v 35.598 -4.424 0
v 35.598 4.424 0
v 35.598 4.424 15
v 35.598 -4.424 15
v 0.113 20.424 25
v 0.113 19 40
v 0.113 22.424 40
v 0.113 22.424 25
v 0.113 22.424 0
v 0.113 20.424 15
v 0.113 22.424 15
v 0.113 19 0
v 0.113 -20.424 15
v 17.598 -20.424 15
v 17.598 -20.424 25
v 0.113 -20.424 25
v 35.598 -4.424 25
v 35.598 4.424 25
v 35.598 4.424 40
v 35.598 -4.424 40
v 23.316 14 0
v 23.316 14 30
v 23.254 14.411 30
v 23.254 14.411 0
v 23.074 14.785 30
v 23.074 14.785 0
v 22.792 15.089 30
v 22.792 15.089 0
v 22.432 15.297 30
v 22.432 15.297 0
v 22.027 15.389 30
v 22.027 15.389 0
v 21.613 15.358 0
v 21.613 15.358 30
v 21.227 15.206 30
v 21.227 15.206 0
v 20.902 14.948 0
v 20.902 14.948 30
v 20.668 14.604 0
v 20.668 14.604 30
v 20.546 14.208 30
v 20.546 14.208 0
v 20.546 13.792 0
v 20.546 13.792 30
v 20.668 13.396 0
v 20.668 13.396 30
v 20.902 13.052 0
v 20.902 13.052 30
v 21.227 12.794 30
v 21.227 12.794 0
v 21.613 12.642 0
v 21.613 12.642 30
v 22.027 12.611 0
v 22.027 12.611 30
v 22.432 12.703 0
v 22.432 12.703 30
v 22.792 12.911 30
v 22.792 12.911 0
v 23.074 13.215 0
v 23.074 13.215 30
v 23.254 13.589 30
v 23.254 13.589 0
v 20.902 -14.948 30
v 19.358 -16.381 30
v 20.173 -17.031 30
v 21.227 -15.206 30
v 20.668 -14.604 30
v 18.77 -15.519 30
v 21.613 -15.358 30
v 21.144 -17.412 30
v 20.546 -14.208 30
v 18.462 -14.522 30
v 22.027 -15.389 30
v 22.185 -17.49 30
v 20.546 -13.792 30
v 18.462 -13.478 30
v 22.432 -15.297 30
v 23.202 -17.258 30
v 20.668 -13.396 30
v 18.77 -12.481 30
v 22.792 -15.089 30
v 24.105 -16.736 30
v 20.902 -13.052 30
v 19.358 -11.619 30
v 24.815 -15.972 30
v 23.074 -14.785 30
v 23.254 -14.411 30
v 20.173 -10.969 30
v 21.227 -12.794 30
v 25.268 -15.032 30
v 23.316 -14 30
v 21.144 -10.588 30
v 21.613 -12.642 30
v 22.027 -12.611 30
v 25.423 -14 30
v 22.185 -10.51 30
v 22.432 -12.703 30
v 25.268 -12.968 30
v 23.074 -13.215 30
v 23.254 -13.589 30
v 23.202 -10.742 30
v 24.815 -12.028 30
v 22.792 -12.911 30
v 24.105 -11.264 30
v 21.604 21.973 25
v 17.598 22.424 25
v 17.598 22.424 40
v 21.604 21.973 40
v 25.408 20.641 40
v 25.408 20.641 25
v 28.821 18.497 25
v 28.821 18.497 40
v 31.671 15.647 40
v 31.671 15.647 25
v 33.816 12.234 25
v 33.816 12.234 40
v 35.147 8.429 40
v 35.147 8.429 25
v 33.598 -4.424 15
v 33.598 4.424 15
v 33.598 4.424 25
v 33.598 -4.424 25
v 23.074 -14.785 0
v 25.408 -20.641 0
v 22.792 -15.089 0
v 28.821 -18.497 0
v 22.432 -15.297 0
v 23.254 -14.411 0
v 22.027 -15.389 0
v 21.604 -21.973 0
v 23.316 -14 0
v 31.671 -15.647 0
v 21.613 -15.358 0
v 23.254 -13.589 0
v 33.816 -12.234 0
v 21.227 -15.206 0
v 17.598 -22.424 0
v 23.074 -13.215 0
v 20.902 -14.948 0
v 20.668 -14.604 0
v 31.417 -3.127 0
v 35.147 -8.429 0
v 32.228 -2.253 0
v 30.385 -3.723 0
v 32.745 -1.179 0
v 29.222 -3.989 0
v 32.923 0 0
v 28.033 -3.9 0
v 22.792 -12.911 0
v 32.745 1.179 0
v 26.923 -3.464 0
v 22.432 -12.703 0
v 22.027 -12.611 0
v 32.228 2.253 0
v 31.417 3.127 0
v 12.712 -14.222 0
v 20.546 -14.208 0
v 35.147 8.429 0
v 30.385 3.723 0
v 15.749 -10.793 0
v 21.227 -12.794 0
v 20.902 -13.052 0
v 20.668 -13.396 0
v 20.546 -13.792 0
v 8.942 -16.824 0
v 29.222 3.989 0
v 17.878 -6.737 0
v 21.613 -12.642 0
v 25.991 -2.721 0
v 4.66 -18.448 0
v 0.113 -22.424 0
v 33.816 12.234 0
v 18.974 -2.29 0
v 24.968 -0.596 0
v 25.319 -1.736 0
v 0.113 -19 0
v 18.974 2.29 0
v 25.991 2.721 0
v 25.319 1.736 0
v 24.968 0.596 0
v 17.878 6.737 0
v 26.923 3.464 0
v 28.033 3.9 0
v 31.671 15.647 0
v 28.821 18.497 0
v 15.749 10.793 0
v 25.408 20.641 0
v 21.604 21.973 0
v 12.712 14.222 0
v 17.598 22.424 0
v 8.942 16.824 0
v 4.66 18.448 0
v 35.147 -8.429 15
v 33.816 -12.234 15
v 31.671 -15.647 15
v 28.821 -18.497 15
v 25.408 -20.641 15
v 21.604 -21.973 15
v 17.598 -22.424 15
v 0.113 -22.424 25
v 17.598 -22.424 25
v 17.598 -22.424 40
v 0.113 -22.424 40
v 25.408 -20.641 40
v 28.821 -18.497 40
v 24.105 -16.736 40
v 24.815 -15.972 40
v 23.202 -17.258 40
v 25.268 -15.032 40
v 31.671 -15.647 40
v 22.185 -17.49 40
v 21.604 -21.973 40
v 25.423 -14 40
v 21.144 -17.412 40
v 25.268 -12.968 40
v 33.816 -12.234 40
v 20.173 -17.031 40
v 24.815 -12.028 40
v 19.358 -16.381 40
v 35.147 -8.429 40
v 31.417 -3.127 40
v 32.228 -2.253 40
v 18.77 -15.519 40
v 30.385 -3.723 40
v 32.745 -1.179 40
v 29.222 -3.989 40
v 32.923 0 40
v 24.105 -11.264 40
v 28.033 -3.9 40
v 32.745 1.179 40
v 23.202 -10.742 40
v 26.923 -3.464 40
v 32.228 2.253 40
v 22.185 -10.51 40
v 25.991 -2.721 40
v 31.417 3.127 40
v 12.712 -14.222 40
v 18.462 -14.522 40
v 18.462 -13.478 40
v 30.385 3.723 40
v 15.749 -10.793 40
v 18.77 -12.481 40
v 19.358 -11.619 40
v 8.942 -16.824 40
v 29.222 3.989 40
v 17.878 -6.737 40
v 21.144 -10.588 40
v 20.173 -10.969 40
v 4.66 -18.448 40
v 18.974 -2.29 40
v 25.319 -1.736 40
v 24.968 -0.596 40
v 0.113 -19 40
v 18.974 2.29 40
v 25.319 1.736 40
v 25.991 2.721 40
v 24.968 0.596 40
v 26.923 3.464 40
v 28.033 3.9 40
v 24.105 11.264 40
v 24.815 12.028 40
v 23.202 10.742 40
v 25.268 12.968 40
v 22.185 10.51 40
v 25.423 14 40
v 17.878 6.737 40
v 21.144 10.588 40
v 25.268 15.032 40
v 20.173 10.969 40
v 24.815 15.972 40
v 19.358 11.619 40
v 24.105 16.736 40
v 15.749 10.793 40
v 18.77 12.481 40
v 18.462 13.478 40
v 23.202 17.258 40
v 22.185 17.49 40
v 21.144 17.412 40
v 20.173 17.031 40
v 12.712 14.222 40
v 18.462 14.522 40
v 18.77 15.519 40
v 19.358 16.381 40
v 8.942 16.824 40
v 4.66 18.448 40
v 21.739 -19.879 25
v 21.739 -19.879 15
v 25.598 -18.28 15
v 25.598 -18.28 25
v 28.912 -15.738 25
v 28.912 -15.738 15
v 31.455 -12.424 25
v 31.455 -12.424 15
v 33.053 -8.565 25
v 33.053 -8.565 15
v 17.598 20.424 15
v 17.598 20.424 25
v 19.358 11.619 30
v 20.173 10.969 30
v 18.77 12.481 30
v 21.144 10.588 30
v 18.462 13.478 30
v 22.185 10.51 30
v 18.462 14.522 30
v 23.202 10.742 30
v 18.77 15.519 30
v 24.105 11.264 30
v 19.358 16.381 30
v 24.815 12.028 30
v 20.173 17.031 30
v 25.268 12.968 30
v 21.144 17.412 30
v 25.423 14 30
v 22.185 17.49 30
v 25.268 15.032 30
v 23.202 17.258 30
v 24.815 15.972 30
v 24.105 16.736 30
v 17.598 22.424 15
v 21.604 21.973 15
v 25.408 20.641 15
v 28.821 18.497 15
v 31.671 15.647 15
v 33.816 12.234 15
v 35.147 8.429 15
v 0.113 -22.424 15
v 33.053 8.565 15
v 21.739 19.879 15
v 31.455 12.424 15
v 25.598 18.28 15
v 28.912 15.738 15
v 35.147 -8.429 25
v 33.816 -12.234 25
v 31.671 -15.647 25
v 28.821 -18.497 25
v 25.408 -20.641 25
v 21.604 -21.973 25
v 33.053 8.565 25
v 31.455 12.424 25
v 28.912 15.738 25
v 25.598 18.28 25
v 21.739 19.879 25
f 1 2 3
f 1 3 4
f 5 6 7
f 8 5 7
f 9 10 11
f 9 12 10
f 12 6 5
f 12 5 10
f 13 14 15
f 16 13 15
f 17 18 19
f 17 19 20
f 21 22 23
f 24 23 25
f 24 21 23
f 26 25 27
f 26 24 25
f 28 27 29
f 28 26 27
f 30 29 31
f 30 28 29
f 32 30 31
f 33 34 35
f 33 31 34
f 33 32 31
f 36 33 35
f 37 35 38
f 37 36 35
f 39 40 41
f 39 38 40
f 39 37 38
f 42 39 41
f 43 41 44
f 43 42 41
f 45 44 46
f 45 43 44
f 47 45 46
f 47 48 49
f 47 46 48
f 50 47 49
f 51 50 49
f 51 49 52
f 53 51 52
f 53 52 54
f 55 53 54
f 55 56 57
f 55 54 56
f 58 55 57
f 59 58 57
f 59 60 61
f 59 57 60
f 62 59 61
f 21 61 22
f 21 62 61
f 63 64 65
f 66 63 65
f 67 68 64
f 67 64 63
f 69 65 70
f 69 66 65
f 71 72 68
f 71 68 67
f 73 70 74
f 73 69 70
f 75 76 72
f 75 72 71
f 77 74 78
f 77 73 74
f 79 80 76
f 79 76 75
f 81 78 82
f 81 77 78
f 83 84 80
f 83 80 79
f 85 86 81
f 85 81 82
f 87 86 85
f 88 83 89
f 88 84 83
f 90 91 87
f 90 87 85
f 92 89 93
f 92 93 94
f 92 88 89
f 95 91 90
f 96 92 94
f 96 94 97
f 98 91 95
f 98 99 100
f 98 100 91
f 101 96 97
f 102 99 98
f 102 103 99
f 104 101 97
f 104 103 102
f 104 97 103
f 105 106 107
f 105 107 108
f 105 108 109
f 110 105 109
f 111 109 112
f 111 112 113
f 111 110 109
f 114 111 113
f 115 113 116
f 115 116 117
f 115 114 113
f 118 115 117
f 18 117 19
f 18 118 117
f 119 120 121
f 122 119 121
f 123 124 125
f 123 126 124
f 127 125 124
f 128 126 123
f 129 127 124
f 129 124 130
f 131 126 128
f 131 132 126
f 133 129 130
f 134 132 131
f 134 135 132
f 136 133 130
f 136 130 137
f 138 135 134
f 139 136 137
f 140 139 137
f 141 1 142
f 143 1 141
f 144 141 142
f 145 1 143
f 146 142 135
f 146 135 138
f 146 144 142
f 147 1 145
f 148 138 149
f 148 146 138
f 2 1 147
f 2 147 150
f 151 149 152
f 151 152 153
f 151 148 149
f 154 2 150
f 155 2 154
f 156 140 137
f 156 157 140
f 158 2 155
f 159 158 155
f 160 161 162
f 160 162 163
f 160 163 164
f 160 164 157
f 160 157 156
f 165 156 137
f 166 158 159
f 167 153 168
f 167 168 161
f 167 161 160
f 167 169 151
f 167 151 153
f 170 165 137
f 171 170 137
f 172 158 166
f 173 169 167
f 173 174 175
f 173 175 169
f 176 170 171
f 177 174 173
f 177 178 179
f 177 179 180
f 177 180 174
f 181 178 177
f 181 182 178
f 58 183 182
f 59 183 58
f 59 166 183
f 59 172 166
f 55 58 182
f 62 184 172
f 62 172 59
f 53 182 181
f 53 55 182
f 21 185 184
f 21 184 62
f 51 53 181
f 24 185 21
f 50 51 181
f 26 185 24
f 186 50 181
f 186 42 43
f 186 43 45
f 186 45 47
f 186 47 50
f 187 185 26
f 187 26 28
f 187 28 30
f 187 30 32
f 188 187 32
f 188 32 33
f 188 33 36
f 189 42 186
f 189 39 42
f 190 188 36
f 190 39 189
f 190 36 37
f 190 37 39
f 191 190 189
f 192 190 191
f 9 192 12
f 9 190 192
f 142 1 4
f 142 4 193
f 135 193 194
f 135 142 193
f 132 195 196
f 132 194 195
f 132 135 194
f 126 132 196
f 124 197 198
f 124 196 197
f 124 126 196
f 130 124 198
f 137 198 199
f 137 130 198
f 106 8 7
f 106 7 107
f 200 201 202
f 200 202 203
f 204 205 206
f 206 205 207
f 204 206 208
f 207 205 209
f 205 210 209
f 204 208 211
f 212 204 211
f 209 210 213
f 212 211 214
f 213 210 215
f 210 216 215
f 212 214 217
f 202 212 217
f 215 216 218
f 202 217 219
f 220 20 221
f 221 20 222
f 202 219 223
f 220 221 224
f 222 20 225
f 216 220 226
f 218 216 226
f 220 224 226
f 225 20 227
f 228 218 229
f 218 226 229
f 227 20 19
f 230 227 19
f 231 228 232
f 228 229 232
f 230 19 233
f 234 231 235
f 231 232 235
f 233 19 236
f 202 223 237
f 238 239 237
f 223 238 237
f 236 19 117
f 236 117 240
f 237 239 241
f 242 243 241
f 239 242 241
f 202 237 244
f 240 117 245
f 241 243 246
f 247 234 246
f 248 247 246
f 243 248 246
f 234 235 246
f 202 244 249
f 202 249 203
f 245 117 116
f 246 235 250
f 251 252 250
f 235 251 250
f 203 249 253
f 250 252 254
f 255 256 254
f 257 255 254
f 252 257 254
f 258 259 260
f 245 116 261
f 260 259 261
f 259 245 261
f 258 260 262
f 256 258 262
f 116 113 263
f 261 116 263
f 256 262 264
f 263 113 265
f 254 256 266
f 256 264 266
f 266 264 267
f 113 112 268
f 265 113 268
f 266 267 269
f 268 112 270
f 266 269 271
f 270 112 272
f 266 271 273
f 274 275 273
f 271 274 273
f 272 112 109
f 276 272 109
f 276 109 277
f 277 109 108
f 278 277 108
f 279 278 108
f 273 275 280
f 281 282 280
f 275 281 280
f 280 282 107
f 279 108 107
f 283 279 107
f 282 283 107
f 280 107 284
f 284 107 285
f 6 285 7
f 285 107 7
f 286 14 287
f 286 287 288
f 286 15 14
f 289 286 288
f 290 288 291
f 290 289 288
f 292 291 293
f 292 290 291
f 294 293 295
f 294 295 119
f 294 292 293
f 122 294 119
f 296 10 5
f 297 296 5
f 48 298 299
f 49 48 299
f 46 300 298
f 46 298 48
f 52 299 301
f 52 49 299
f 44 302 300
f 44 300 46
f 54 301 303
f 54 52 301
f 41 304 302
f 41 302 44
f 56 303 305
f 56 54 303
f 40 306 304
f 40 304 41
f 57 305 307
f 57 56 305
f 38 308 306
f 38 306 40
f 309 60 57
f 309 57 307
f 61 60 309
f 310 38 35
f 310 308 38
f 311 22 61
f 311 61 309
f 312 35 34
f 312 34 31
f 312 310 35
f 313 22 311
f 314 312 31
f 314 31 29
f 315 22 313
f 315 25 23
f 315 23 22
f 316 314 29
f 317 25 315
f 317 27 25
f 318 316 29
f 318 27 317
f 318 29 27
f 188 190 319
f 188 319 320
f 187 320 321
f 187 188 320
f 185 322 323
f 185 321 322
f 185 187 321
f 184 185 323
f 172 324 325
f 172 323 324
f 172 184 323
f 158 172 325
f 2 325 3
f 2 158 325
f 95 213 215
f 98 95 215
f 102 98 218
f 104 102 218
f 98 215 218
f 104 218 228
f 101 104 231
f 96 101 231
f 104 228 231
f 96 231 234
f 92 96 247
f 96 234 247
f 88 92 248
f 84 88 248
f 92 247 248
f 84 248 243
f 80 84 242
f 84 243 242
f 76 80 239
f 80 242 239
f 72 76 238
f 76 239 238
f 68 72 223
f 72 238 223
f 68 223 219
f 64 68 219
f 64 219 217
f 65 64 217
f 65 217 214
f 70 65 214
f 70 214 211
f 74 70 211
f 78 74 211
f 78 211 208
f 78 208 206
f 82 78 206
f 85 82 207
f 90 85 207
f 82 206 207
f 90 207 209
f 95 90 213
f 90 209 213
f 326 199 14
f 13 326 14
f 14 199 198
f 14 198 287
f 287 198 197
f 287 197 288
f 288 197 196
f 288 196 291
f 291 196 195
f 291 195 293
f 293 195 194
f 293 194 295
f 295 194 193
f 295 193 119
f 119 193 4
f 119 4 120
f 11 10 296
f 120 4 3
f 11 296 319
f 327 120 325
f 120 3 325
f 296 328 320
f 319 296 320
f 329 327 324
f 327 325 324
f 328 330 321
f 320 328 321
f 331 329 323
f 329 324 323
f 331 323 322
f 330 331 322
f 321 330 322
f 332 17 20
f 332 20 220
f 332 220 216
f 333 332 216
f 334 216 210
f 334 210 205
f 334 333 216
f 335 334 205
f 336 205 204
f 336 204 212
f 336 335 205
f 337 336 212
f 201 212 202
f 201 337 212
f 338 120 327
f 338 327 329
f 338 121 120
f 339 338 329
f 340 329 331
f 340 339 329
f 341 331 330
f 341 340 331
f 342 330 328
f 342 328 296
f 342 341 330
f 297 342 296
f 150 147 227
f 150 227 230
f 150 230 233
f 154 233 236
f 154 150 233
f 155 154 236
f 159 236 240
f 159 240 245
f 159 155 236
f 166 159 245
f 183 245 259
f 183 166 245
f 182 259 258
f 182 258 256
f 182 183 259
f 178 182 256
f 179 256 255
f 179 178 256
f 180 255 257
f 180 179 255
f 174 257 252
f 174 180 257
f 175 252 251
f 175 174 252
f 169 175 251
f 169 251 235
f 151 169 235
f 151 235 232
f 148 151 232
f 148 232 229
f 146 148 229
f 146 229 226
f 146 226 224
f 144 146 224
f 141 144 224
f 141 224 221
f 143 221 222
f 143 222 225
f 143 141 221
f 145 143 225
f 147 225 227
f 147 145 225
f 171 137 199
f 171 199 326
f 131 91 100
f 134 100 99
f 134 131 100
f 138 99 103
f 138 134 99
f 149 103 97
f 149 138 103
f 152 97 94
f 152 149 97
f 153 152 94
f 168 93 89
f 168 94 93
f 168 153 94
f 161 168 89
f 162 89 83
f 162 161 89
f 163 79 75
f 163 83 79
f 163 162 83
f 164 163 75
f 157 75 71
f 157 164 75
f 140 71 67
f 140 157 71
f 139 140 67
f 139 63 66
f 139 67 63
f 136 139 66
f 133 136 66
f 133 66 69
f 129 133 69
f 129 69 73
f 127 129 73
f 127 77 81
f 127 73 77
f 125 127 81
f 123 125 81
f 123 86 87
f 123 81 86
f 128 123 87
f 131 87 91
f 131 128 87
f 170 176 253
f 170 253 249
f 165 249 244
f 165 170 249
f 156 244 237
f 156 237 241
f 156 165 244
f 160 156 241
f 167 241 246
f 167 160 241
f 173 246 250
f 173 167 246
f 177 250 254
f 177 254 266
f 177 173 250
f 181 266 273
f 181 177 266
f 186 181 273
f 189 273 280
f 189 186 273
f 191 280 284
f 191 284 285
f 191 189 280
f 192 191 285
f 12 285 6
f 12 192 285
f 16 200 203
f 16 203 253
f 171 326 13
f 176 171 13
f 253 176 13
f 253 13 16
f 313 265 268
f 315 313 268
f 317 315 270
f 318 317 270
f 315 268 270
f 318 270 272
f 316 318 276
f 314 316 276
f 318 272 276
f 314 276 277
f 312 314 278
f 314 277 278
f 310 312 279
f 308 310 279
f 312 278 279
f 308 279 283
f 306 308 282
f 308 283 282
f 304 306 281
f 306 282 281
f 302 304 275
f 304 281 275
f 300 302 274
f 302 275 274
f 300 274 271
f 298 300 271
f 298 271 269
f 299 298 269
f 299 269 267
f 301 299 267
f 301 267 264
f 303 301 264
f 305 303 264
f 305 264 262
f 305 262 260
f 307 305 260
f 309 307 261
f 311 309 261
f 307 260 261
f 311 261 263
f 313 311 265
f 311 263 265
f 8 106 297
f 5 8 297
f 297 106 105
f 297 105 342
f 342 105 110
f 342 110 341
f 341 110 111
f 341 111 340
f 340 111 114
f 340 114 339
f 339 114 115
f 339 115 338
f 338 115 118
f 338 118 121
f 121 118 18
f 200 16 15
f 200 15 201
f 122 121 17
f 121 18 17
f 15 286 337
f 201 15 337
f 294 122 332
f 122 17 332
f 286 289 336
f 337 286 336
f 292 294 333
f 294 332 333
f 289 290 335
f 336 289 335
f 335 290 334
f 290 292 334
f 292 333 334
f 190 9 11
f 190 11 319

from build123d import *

# Parameters (mm, degrees)
ESBO_O1_R                = 1.393053459
ESBO_O1_R_2              = 4
RESSALTO_EXTRUS_O1_DEPTH = 40
ESBO_O8_W                = 10
ESBO_O8_H                = 2
ESBO_O10_R               = 3.5
CORTE_EXTRUS_O1_DEPTH    = 10


with BuildPart() as part:
    # Esboço1 → Ressalto-extrusão1 (new body)
    with BuildSketch(Plane.XY):
        with BuildLine():
            Line((0.112562331, -22.423877672), (0.112562331, -19))
            ThreePointArc((0.112562331, -19), (19.112562331, 0), (0.112562331, 19))
            Line((0.112562331, 19), (0.112562331, 22.423877672))
            Line((0.112562331, 22.423877672), (17.598208573, 22.423877672))
            ThreePointArc((17.598208573, 22.423877672), (30.326130634, 17.151799733), (35.598208573, 4.423877672))
            Line((35.598208573, 4.423877672), (35.598208573, -4.423877672))
            ThreePointArc((35.598208573, -4.423877672), (30.326130634, -17.151799733), (17.598208573, -22.423877672))
            Line((17.598208573, -22.423877672), (0.112562331, -22.423877672))
        make_face()
        with Locations((21.9231968, -14)):
            Circle(ESBO_O1_R, mode=Mode.SUBTRACT)
        with Locations((21.9231968, 14)):
            Circle(ESBO_O1_R, mode=Mode.SUBTRACT)
        with Locations((28.9231968, 0)):
            Circle(ESBO_O1_R_2, mode=Mode.SUBTRACT)
    extrude(amount=RESSALTO_EXTRUS_O1_DEPTH)

    # Varredura de corte1: sweep along a path in Esboço9
    with BuildLine(Plane.XY.offset(40)) as varredura_de_corte1_path:
        Line((0.112562331, -22.423877672), (17.598208573, -22.423877672))
        ThreePointArc((17.598208573, -22.423877672), (30.326130634, -17.151799733), (35.598208573, -4.423877672))
        Line((35.598208573, -4.423877672), (35.598208573, 4.423877672))
        ThreePointArc((35.598208573, 4.423877672), (30.326130634, 17.151799733), (17.598208573, 22.423877672))
        Line((17.598208573, 22.423877672), (0.112562331, 22.423877672))
    # Esboço8 → Varredura de corte1 (sweep, cut)
    with BuildSketch(Plane.ZY.offset(-0.112562331)):
        with Locations((20, 21.423877672)):
            Rectangle(ESBO_O8_W, ESBO_O8_H)
    sweep(path=varredura_de_corte1_path.line, mode=Mode.SUBTRACT)

    # Esboço10 → Corte-extrusão1 (cut)
    with BuildSketch(Plane.XY.offset(40)):
        with Locations((21.9231968, 14)):
            Circle(ESBO_O10_R)
        with Locations((21.9231968, -14)):
            Circle(ESBO_O10_R)
    extrude(amount=-CORTE_EXTRUS_O1_DEPTH, mode=Mode.SUBTRACT)


solid = part.part
